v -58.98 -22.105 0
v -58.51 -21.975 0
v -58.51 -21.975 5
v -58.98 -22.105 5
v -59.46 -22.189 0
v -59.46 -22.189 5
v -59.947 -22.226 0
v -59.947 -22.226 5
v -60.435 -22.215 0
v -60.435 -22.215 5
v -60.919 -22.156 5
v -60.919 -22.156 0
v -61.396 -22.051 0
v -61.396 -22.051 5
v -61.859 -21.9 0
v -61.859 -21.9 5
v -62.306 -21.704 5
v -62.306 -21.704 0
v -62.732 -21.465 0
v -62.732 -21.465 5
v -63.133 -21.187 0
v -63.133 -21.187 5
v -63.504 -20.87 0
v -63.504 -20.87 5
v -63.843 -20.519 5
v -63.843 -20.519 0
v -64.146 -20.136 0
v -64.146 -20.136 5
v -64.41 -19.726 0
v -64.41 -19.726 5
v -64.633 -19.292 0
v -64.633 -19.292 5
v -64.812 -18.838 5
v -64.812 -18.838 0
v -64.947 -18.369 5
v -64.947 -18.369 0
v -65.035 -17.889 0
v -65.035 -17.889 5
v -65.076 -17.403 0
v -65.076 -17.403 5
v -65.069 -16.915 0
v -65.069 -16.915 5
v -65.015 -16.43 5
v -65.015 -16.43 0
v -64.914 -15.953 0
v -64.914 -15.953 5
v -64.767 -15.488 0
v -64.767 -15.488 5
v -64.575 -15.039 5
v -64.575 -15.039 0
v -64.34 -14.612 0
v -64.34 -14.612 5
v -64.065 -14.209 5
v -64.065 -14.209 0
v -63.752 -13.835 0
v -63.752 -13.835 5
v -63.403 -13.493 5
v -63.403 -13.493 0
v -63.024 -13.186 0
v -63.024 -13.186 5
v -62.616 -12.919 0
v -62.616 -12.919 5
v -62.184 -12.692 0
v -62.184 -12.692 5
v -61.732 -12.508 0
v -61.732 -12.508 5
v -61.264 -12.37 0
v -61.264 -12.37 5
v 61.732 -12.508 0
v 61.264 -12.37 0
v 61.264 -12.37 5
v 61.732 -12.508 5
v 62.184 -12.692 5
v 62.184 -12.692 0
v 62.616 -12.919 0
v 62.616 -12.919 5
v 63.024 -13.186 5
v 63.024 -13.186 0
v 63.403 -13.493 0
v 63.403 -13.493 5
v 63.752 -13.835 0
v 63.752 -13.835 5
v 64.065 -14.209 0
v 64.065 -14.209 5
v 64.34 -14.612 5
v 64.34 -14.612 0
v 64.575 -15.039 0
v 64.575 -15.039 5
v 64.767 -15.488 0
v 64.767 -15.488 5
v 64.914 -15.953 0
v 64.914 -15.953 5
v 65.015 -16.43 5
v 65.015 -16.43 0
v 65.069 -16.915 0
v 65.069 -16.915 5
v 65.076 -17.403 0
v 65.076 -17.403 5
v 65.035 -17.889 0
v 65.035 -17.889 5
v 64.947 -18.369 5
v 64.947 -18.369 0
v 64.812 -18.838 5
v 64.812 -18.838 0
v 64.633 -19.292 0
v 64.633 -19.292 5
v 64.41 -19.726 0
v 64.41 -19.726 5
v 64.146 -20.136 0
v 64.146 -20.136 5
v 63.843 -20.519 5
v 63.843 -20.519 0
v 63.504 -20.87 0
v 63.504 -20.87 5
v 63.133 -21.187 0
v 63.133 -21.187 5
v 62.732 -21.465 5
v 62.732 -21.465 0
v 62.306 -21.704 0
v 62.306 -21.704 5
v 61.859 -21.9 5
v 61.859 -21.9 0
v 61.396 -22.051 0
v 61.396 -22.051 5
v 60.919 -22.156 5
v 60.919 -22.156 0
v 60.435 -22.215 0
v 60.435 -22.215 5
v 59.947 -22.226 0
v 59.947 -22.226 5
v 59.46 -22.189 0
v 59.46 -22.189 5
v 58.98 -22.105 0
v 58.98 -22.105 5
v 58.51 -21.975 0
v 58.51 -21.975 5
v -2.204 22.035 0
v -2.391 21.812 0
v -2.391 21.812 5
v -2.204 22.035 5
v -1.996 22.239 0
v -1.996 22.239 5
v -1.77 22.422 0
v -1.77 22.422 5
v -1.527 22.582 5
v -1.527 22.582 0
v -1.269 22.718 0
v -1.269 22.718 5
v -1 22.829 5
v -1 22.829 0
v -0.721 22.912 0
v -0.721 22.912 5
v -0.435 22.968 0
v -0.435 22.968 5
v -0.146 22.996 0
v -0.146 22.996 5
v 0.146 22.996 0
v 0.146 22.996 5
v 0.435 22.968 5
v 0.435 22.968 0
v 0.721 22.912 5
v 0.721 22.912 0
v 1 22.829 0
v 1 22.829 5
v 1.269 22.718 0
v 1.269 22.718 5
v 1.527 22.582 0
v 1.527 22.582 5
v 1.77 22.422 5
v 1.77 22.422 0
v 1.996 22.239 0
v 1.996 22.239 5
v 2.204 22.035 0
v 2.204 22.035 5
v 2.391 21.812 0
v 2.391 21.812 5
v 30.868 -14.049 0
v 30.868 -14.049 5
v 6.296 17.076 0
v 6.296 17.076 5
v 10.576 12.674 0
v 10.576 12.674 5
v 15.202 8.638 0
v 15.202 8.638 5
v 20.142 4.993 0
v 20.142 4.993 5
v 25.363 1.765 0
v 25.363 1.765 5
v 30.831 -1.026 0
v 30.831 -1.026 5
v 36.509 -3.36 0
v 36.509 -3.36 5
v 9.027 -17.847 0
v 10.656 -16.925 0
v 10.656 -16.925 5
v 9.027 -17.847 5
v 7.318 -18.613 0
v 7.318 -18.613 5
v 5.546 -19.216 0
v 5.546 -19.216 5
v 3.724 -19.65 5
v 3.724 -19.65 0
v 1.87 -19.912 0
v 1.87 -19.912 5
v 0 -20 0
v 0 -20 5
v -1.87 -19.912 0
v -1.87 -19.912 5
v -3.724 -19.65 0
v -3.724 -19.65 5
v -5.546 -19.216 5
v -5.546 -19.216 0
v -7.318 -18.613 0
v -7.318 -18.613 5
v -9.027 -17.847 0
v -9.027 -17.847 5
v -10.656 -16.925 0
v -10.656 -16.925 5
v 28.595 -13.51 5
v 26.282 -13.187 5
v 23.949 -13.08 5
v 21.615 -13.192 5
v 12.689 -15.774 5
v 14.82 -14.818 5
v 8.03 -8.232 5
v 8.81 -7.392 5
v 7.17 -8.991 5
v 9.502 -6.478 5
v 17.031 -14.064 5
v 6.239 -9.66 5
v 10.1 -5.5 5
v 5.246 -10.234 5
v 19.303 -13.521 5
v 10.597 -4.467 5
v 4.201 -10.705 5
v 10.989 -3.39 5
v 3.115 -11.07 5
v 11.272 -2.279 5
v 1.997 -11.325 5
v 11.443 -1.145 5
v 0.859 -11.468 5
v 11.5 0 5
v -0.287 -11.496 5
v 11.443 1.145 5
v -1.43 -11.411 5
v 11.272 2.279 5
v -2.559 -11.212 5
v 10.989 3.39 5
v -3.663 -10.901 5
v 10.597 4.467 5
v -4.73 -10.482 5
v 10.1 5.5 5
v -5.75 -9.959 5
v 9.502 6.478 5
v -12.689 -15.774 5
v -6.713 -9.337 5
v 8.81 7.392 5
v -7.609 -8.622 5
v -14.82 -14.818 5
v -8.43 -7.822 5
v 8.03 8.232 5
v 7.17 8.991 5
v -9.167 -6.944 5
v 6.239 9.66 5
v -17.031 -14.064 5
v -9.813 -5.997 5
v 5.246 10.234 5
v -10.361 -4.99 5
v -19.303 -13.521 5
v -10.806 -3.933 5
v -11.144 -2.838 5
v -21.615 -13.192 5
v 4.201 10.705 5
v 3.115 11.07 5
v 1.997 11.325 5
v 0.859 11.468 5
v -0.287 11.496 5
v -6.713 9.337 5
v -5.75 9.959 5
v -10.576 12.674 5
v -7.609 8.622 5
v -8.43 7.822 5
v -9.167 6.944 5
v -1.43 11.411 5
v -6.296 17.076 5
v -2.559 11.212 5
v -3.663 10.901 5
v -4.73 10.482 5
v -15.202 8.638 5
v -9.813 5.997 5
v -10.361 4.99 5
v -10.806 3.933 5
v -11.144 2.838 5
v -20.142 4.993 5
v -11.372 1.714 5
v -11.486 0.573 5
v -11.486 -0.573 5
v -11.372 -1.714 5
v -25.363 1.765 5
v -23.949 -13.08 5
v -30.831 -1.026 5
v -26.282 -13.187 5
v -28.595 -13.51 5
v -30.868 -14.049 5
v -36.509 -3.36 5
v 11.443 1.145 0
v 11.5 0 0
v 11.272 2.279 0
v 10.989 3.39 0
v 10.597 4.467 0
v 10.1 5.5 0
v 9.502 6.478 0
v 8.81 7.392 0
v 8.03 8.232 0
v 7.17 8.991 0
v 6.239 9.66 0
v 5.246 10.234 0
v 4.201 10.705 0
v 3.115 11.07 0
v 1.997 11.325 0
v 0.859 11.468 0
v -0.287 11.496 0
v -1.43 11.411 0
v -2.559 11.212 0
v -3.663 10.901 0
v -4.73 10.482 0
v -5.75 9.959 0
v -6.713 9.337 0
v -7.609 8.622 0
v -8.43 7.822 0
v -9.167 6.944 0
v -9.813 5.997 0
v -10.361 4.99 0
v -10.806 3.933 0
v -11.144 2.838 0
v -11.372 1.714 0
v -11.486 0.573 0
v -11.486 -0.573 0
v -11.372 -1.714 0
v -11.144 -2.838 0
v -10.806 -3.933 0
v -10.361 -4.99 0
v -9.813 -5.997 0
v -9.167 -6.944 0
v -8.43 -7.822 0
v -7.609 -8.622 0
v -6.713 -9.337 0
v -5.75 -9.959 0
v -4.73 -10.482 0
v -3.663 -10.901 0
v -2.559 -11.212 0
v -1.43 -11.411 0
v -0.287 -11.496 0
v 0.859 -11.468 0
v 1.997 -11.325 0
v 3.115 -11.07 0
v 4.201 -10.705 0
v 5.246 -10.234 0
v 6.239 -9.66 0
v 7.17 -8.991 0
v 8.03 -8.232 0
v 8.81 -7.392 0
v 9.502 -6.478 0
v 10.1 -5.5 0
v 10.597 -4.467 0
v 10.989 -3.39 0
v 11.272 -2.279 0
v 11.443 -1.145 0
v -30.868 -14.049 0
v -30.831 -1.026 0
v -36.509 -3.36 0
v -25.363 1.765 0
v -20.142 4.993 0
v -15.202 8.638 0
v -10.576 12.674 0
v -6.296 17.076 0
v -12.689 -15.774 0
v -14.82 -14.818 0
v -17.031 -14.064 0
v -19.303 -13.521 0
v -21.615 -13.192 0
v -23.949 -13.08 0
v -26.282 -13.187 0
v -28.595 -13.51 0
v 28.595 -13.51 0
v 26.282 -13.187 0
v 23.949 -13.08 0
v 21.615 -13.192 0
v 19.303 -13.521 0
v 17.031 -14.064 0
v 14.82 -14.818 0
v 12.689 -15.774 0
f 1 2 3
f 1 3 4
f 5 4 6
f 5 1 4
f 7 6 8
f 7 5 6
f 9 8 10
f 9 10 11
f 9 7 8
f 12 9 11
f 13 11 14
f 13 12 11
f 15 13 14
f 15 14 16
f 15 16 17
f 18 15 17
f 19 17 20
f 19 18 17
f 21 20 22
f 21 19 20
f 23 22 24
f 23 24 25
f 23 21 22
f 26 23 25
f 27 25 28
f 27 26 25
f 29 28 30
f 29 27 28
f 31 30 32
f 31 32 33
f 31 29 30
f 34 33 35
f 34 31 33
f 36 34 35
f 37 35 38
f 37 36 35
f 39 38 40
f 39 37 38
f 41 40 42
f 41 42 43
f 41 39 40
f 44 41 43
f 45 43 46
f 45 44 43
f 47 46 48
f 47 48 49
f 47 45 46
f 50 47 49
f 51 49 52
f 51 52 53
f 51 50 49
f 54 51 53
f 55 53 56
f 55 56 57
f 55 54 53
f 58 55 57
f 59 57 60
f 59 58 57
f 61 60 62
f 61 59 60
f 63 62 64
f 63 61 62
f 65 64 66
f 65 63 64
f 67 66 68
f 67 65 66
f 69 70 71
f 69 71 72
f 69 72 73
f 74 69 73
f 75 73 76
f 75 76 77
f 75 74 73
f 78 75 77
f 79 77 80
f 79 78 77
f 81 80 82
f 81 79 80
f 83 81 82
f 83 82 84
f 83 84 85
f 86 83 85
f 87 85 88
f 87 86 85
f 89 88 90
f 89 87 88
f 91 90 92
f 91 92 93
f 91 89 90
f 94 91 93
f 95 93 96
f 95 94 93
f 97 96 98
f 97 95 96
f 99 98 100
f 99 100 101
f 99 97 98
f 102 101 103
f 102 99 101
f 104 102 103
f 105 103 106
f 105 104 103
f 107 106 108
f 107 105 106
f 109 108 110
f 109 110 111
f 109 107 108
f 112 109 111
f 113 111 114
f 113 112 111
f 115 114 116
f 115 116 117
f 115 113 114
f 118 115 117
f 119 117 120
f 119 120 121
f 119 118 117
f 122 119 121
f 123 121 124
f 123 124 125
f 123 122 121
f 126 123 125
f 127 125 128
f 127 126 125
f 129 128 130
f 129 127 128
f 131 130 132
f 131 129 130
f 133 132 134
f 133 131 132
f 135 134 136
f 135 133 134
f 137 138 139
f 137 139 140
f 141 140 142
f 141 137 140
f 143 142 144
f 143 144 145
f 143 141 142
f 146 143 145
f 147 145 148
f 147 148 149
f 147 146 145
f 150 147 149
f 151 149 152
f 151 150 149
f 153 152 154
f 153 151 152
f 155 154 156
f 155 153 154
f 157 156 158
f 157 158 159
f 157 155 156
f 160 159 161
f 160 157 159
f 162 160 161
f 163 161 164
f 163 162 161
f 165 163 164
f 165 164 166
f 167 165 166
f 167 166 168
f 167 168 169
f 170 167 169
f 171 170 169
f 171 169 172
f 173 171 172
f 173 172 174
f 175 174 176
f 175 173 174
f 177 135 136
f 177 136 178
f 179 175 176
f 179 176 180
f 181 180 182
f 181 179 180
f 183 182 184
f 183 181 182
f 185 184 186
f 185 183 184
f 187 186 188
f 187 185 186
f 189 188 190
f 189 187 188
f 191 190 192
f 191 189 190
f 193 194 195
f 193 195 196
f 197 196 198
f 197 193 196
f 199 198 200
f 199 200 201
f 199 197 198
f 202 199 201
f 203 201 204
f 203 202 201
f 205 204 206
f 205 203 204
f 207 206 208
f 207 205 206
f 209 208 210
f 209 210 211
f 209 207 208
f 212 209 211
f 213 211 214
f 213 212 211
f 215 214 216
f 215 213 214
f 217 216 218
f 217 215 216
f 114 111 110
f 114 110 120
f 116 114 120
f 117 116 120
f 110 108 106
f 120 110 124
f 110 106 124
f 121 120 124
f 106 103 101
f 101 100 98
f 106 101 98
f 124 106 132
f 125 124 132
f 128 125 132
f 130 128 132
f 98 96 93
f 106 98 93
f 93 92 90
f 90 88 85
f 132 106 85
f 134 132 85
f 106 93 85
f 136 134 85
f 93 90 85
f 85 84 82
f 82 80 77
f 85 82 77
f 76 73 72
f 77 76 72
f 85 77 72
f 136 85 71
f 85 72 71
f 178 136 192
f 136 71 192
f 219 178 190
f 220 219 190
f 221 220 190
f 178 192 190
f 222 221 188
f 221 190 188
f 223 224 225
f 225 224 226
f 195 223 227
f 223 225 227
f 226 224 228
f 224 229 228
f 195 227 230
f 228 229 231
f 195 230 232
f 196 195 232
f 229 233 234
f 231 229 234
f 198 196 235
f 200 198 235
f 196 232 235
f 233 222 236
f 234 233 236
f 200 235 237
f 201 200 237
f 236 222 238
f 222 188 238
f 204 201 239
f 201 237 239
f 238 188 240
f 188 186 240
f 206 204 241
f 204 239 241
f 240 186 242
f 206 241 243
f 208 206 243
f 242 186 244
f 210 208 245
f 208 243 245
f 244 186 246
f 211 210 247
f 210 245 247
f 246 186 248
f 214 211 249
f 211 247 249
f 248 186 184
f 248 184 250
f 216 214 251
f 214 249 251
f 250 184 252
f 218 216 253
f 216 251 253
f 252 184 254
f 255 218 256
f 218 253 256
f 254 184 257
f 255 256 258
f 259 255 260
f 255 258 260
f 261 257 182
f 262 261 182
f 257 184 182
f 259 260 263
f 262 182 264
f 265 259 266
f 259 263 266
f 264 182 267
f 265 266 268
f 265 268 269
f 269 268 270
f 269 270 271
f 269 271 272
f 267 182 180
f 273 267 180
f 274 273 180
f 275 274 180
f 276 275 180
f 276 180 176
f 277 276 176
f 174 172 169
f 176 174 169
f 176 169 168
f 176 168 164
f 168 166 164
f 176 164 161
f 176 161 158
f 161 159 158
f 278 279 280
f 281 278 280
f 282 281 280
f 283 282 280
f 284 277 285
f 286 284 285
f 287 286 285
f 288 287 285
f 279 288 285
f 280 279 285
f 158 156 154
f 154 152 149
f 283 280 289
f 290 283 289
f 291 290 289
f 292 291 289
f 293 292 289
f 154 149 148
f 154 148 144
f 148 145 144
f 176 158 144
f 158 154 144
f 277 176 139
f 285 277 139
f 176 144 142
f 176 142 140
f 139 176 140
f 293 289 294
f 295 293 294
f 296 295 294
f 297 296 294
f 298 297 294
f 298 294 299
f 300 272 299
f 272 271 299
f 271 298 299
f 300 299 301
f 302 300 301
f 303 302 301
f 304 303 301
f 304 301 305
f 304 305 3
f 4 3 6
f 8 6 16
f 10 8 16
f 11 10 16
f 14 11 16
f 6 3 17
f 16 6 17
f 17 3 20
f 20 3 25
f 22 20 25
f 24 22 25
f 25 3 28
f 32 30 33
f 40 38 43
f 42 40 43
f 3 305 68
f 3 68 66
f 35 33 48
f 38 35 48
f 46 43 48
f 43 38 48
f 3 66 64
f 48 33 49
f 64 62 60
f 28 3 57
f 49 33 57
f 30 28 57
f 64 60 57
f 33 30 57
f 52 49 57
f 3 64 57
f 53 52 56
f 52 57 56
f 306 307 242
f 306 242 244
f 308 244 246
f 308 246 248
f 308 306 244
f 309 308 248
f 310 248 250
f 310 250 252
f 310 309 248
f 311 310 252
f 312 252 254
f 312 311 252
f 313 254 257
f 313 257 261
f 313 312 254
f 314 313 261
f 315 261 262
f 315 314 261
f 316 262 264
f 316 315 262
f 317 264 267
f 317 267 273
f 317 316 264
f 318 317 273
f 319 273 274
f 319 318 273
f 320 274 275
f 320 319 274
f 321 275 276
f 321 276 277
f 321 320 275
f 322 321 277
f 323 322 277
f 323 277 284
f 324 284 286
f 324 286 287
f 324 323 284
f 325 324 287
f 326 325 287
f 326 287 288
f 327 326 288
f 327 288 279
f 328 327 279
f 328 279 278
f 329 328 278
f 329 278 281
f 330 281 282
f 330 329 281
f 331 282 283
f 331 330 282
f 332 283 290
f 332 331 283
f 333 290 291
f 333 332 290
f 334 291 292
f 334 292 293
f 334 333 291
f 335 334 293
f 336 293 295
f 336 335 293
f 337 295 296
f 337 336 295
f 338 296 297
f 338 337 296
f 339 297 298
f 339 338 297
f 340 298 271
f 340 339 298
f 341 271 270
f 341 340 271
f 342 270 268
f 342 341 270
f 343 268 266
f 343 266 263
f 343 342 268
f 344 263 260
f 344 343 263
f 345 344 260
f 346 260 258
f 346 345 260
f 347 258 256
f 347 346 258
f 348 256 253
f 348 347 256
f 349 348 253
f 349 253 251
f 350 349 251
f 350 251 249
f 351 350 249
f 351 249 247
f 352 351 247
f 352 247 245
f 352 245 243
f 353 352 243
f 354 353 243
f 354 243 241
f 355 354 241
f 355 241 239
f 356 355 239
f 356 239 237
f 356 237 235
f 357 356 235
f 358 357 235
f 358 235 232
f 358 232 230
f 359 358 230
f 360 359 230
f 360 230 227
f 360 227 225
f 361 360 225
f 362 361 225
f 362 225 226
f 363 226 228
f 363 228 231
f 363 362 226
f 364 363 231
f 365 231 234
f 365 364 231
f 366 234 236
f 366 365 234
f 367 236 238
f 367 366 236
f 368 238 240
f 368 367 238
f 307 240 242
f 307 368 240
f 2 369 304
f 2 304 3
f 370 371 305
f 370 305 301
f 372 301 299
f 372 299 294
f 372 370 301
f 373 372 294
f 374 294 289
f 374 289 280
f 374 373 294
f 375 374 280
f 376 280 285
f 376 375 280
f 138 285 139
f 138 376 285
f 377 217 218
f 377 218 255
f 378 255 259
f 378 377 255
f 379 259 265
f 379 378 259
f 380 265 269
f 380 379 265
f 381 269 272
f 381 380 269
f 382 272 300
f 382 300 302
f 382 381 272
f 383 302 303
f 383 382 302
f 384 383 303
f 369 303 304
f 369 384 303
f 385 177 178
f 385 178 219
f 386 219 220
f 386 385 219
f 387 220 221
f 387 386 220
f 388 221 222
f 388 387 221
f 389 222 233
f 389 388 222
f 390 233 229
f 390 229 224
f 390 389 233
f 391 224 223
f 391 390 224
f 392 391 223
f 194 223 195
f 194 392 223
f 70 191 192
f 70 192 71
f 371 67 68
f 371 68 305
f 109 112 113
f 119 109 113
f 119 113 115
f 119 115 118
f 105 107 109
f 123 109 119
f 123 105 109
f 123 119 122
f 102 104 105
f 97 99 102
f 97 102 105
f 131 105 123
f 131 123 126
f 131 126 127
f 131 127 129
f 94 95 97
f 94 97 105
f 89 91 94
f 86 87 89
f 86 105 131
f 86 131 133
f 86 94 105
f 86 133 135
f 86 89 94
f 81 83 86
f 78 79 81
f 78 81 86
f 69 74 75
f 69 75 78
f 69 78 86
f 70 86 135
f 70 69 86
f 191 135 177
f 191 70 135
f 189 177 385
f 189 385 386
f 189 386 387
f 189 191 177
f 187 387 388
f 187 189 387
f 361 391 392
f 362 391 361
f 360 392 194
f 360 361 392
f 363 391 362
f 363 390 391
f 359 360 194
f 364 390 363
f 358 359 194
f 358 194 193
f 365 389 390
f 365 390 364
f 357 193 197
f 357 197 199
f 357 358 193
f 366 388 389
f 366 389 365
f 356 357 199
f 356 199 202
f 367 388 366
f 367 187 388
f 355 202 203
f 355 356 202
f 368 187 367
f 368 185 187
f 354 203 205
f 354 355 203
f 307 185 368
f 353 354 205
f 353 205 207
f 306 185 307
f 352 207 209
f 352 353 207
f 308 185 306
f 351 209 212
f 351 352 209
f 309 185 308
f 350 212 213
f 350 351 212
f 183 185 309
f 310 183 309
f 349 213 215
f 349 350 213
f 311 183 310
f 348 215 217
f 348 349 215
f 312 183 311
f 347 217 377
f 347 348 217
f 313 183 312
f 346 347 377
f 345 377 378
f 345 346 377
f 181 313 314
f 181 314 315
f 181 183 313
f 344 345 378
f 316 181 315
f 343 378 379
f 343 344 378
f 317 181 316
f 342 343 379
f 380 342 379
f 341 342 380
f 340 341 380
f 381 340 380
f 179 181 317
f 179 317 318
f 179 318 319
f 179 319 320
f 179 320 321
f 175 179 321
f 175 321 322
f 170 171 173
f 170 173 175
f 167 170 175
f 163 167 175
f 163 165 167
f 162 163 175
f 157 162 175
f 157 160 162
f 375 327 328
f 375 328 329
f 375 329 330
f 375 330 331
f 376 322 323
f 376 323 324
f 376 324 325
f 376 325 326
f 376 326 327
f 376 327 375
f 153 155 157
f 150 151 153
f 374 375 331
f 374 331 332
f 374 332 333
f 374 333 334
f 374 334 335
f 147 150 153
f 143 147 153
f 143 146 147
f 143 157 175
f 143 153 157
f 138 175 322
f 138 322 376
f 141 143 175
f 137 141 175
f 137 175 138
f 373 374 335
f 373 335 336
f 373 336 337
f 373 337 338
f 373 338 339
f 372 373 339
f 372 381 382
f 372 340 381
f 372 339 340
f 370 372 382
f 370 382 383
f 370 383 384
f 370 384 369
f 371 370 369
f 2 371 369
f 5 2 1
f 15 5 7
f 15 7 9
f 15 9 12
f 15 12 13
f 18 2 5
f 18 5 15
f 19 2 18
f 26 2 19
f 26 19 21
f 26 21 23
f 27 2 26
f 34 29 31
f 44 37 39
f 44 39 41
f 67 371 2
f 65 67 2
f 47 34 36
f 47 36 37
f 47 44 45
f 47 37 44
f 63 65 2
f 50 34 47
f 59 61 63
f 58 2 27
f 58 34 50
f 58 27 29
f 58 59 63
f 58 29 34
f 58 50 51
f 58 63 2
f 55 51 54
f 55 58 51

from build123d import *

# Parameters (mm, degrees)
SKETCH1_R           = 11.5
BOSS_EXTRUDE1_DEPTH = 5


with BuildPart() as part:
    # Sketch1 → Boss-Extrude1 (new body)
    with BuildSketch(Plane.XY):
        with BuildLine():
            Line((58.509519869, -21.974669161), (30.868053734, -14.048606291))
            ThreePointArc((30.868053734, -14.048606291), (20.455340601, -13.329450296), (10.656497706, -16.924510529))
            ThreePointArc((10.656497706, -16.924510529), (0, -20), (-10.656497706, -16.924510529))
            ThreePointArc((-10.656497706, -16.924510529), (-20.455340601, -13.329450296), (-30.868053734, -14.048606291))
            Line((-30.868053734, -14.048606291), (-58.509519869, -21.974669161))
            ThreePointArc((-58.509519869, -21.974669161), (-64.885164476, -18.605521518), (-61.263687445, -12.369745374))
            Line((-61.263687445, -12.369745374), (-36.509479216, -3.359950405))
            ThreePointArc((-36.509479216, -3.359950405), (-17.634305645, 6.764909334), (-2.390807306, 21.81219216))
            ThreePointArc((-2.390807306, 21.81219216), (0, 23), (2.390807306, 21.81219216))
            ThreePointArc((2.390807306, 21.81219216), (17.634305645, 6.764909334), (36.509479216, -3.359950405))
            Line((36.509479216, -3.359950405), (61.263687445, -12.369745374))
            ThreePointArc((61.263687445, -12.369745374), (64.885164476, -18.605521518), (58.509519869, -21.974669161))
        make_face()
        Circle(SKETCH1_R, mode=Mode.SUBTRACT)
    extrude(amount=BOSS_EXTRUDE1_DEPTH)


solid = part.part
